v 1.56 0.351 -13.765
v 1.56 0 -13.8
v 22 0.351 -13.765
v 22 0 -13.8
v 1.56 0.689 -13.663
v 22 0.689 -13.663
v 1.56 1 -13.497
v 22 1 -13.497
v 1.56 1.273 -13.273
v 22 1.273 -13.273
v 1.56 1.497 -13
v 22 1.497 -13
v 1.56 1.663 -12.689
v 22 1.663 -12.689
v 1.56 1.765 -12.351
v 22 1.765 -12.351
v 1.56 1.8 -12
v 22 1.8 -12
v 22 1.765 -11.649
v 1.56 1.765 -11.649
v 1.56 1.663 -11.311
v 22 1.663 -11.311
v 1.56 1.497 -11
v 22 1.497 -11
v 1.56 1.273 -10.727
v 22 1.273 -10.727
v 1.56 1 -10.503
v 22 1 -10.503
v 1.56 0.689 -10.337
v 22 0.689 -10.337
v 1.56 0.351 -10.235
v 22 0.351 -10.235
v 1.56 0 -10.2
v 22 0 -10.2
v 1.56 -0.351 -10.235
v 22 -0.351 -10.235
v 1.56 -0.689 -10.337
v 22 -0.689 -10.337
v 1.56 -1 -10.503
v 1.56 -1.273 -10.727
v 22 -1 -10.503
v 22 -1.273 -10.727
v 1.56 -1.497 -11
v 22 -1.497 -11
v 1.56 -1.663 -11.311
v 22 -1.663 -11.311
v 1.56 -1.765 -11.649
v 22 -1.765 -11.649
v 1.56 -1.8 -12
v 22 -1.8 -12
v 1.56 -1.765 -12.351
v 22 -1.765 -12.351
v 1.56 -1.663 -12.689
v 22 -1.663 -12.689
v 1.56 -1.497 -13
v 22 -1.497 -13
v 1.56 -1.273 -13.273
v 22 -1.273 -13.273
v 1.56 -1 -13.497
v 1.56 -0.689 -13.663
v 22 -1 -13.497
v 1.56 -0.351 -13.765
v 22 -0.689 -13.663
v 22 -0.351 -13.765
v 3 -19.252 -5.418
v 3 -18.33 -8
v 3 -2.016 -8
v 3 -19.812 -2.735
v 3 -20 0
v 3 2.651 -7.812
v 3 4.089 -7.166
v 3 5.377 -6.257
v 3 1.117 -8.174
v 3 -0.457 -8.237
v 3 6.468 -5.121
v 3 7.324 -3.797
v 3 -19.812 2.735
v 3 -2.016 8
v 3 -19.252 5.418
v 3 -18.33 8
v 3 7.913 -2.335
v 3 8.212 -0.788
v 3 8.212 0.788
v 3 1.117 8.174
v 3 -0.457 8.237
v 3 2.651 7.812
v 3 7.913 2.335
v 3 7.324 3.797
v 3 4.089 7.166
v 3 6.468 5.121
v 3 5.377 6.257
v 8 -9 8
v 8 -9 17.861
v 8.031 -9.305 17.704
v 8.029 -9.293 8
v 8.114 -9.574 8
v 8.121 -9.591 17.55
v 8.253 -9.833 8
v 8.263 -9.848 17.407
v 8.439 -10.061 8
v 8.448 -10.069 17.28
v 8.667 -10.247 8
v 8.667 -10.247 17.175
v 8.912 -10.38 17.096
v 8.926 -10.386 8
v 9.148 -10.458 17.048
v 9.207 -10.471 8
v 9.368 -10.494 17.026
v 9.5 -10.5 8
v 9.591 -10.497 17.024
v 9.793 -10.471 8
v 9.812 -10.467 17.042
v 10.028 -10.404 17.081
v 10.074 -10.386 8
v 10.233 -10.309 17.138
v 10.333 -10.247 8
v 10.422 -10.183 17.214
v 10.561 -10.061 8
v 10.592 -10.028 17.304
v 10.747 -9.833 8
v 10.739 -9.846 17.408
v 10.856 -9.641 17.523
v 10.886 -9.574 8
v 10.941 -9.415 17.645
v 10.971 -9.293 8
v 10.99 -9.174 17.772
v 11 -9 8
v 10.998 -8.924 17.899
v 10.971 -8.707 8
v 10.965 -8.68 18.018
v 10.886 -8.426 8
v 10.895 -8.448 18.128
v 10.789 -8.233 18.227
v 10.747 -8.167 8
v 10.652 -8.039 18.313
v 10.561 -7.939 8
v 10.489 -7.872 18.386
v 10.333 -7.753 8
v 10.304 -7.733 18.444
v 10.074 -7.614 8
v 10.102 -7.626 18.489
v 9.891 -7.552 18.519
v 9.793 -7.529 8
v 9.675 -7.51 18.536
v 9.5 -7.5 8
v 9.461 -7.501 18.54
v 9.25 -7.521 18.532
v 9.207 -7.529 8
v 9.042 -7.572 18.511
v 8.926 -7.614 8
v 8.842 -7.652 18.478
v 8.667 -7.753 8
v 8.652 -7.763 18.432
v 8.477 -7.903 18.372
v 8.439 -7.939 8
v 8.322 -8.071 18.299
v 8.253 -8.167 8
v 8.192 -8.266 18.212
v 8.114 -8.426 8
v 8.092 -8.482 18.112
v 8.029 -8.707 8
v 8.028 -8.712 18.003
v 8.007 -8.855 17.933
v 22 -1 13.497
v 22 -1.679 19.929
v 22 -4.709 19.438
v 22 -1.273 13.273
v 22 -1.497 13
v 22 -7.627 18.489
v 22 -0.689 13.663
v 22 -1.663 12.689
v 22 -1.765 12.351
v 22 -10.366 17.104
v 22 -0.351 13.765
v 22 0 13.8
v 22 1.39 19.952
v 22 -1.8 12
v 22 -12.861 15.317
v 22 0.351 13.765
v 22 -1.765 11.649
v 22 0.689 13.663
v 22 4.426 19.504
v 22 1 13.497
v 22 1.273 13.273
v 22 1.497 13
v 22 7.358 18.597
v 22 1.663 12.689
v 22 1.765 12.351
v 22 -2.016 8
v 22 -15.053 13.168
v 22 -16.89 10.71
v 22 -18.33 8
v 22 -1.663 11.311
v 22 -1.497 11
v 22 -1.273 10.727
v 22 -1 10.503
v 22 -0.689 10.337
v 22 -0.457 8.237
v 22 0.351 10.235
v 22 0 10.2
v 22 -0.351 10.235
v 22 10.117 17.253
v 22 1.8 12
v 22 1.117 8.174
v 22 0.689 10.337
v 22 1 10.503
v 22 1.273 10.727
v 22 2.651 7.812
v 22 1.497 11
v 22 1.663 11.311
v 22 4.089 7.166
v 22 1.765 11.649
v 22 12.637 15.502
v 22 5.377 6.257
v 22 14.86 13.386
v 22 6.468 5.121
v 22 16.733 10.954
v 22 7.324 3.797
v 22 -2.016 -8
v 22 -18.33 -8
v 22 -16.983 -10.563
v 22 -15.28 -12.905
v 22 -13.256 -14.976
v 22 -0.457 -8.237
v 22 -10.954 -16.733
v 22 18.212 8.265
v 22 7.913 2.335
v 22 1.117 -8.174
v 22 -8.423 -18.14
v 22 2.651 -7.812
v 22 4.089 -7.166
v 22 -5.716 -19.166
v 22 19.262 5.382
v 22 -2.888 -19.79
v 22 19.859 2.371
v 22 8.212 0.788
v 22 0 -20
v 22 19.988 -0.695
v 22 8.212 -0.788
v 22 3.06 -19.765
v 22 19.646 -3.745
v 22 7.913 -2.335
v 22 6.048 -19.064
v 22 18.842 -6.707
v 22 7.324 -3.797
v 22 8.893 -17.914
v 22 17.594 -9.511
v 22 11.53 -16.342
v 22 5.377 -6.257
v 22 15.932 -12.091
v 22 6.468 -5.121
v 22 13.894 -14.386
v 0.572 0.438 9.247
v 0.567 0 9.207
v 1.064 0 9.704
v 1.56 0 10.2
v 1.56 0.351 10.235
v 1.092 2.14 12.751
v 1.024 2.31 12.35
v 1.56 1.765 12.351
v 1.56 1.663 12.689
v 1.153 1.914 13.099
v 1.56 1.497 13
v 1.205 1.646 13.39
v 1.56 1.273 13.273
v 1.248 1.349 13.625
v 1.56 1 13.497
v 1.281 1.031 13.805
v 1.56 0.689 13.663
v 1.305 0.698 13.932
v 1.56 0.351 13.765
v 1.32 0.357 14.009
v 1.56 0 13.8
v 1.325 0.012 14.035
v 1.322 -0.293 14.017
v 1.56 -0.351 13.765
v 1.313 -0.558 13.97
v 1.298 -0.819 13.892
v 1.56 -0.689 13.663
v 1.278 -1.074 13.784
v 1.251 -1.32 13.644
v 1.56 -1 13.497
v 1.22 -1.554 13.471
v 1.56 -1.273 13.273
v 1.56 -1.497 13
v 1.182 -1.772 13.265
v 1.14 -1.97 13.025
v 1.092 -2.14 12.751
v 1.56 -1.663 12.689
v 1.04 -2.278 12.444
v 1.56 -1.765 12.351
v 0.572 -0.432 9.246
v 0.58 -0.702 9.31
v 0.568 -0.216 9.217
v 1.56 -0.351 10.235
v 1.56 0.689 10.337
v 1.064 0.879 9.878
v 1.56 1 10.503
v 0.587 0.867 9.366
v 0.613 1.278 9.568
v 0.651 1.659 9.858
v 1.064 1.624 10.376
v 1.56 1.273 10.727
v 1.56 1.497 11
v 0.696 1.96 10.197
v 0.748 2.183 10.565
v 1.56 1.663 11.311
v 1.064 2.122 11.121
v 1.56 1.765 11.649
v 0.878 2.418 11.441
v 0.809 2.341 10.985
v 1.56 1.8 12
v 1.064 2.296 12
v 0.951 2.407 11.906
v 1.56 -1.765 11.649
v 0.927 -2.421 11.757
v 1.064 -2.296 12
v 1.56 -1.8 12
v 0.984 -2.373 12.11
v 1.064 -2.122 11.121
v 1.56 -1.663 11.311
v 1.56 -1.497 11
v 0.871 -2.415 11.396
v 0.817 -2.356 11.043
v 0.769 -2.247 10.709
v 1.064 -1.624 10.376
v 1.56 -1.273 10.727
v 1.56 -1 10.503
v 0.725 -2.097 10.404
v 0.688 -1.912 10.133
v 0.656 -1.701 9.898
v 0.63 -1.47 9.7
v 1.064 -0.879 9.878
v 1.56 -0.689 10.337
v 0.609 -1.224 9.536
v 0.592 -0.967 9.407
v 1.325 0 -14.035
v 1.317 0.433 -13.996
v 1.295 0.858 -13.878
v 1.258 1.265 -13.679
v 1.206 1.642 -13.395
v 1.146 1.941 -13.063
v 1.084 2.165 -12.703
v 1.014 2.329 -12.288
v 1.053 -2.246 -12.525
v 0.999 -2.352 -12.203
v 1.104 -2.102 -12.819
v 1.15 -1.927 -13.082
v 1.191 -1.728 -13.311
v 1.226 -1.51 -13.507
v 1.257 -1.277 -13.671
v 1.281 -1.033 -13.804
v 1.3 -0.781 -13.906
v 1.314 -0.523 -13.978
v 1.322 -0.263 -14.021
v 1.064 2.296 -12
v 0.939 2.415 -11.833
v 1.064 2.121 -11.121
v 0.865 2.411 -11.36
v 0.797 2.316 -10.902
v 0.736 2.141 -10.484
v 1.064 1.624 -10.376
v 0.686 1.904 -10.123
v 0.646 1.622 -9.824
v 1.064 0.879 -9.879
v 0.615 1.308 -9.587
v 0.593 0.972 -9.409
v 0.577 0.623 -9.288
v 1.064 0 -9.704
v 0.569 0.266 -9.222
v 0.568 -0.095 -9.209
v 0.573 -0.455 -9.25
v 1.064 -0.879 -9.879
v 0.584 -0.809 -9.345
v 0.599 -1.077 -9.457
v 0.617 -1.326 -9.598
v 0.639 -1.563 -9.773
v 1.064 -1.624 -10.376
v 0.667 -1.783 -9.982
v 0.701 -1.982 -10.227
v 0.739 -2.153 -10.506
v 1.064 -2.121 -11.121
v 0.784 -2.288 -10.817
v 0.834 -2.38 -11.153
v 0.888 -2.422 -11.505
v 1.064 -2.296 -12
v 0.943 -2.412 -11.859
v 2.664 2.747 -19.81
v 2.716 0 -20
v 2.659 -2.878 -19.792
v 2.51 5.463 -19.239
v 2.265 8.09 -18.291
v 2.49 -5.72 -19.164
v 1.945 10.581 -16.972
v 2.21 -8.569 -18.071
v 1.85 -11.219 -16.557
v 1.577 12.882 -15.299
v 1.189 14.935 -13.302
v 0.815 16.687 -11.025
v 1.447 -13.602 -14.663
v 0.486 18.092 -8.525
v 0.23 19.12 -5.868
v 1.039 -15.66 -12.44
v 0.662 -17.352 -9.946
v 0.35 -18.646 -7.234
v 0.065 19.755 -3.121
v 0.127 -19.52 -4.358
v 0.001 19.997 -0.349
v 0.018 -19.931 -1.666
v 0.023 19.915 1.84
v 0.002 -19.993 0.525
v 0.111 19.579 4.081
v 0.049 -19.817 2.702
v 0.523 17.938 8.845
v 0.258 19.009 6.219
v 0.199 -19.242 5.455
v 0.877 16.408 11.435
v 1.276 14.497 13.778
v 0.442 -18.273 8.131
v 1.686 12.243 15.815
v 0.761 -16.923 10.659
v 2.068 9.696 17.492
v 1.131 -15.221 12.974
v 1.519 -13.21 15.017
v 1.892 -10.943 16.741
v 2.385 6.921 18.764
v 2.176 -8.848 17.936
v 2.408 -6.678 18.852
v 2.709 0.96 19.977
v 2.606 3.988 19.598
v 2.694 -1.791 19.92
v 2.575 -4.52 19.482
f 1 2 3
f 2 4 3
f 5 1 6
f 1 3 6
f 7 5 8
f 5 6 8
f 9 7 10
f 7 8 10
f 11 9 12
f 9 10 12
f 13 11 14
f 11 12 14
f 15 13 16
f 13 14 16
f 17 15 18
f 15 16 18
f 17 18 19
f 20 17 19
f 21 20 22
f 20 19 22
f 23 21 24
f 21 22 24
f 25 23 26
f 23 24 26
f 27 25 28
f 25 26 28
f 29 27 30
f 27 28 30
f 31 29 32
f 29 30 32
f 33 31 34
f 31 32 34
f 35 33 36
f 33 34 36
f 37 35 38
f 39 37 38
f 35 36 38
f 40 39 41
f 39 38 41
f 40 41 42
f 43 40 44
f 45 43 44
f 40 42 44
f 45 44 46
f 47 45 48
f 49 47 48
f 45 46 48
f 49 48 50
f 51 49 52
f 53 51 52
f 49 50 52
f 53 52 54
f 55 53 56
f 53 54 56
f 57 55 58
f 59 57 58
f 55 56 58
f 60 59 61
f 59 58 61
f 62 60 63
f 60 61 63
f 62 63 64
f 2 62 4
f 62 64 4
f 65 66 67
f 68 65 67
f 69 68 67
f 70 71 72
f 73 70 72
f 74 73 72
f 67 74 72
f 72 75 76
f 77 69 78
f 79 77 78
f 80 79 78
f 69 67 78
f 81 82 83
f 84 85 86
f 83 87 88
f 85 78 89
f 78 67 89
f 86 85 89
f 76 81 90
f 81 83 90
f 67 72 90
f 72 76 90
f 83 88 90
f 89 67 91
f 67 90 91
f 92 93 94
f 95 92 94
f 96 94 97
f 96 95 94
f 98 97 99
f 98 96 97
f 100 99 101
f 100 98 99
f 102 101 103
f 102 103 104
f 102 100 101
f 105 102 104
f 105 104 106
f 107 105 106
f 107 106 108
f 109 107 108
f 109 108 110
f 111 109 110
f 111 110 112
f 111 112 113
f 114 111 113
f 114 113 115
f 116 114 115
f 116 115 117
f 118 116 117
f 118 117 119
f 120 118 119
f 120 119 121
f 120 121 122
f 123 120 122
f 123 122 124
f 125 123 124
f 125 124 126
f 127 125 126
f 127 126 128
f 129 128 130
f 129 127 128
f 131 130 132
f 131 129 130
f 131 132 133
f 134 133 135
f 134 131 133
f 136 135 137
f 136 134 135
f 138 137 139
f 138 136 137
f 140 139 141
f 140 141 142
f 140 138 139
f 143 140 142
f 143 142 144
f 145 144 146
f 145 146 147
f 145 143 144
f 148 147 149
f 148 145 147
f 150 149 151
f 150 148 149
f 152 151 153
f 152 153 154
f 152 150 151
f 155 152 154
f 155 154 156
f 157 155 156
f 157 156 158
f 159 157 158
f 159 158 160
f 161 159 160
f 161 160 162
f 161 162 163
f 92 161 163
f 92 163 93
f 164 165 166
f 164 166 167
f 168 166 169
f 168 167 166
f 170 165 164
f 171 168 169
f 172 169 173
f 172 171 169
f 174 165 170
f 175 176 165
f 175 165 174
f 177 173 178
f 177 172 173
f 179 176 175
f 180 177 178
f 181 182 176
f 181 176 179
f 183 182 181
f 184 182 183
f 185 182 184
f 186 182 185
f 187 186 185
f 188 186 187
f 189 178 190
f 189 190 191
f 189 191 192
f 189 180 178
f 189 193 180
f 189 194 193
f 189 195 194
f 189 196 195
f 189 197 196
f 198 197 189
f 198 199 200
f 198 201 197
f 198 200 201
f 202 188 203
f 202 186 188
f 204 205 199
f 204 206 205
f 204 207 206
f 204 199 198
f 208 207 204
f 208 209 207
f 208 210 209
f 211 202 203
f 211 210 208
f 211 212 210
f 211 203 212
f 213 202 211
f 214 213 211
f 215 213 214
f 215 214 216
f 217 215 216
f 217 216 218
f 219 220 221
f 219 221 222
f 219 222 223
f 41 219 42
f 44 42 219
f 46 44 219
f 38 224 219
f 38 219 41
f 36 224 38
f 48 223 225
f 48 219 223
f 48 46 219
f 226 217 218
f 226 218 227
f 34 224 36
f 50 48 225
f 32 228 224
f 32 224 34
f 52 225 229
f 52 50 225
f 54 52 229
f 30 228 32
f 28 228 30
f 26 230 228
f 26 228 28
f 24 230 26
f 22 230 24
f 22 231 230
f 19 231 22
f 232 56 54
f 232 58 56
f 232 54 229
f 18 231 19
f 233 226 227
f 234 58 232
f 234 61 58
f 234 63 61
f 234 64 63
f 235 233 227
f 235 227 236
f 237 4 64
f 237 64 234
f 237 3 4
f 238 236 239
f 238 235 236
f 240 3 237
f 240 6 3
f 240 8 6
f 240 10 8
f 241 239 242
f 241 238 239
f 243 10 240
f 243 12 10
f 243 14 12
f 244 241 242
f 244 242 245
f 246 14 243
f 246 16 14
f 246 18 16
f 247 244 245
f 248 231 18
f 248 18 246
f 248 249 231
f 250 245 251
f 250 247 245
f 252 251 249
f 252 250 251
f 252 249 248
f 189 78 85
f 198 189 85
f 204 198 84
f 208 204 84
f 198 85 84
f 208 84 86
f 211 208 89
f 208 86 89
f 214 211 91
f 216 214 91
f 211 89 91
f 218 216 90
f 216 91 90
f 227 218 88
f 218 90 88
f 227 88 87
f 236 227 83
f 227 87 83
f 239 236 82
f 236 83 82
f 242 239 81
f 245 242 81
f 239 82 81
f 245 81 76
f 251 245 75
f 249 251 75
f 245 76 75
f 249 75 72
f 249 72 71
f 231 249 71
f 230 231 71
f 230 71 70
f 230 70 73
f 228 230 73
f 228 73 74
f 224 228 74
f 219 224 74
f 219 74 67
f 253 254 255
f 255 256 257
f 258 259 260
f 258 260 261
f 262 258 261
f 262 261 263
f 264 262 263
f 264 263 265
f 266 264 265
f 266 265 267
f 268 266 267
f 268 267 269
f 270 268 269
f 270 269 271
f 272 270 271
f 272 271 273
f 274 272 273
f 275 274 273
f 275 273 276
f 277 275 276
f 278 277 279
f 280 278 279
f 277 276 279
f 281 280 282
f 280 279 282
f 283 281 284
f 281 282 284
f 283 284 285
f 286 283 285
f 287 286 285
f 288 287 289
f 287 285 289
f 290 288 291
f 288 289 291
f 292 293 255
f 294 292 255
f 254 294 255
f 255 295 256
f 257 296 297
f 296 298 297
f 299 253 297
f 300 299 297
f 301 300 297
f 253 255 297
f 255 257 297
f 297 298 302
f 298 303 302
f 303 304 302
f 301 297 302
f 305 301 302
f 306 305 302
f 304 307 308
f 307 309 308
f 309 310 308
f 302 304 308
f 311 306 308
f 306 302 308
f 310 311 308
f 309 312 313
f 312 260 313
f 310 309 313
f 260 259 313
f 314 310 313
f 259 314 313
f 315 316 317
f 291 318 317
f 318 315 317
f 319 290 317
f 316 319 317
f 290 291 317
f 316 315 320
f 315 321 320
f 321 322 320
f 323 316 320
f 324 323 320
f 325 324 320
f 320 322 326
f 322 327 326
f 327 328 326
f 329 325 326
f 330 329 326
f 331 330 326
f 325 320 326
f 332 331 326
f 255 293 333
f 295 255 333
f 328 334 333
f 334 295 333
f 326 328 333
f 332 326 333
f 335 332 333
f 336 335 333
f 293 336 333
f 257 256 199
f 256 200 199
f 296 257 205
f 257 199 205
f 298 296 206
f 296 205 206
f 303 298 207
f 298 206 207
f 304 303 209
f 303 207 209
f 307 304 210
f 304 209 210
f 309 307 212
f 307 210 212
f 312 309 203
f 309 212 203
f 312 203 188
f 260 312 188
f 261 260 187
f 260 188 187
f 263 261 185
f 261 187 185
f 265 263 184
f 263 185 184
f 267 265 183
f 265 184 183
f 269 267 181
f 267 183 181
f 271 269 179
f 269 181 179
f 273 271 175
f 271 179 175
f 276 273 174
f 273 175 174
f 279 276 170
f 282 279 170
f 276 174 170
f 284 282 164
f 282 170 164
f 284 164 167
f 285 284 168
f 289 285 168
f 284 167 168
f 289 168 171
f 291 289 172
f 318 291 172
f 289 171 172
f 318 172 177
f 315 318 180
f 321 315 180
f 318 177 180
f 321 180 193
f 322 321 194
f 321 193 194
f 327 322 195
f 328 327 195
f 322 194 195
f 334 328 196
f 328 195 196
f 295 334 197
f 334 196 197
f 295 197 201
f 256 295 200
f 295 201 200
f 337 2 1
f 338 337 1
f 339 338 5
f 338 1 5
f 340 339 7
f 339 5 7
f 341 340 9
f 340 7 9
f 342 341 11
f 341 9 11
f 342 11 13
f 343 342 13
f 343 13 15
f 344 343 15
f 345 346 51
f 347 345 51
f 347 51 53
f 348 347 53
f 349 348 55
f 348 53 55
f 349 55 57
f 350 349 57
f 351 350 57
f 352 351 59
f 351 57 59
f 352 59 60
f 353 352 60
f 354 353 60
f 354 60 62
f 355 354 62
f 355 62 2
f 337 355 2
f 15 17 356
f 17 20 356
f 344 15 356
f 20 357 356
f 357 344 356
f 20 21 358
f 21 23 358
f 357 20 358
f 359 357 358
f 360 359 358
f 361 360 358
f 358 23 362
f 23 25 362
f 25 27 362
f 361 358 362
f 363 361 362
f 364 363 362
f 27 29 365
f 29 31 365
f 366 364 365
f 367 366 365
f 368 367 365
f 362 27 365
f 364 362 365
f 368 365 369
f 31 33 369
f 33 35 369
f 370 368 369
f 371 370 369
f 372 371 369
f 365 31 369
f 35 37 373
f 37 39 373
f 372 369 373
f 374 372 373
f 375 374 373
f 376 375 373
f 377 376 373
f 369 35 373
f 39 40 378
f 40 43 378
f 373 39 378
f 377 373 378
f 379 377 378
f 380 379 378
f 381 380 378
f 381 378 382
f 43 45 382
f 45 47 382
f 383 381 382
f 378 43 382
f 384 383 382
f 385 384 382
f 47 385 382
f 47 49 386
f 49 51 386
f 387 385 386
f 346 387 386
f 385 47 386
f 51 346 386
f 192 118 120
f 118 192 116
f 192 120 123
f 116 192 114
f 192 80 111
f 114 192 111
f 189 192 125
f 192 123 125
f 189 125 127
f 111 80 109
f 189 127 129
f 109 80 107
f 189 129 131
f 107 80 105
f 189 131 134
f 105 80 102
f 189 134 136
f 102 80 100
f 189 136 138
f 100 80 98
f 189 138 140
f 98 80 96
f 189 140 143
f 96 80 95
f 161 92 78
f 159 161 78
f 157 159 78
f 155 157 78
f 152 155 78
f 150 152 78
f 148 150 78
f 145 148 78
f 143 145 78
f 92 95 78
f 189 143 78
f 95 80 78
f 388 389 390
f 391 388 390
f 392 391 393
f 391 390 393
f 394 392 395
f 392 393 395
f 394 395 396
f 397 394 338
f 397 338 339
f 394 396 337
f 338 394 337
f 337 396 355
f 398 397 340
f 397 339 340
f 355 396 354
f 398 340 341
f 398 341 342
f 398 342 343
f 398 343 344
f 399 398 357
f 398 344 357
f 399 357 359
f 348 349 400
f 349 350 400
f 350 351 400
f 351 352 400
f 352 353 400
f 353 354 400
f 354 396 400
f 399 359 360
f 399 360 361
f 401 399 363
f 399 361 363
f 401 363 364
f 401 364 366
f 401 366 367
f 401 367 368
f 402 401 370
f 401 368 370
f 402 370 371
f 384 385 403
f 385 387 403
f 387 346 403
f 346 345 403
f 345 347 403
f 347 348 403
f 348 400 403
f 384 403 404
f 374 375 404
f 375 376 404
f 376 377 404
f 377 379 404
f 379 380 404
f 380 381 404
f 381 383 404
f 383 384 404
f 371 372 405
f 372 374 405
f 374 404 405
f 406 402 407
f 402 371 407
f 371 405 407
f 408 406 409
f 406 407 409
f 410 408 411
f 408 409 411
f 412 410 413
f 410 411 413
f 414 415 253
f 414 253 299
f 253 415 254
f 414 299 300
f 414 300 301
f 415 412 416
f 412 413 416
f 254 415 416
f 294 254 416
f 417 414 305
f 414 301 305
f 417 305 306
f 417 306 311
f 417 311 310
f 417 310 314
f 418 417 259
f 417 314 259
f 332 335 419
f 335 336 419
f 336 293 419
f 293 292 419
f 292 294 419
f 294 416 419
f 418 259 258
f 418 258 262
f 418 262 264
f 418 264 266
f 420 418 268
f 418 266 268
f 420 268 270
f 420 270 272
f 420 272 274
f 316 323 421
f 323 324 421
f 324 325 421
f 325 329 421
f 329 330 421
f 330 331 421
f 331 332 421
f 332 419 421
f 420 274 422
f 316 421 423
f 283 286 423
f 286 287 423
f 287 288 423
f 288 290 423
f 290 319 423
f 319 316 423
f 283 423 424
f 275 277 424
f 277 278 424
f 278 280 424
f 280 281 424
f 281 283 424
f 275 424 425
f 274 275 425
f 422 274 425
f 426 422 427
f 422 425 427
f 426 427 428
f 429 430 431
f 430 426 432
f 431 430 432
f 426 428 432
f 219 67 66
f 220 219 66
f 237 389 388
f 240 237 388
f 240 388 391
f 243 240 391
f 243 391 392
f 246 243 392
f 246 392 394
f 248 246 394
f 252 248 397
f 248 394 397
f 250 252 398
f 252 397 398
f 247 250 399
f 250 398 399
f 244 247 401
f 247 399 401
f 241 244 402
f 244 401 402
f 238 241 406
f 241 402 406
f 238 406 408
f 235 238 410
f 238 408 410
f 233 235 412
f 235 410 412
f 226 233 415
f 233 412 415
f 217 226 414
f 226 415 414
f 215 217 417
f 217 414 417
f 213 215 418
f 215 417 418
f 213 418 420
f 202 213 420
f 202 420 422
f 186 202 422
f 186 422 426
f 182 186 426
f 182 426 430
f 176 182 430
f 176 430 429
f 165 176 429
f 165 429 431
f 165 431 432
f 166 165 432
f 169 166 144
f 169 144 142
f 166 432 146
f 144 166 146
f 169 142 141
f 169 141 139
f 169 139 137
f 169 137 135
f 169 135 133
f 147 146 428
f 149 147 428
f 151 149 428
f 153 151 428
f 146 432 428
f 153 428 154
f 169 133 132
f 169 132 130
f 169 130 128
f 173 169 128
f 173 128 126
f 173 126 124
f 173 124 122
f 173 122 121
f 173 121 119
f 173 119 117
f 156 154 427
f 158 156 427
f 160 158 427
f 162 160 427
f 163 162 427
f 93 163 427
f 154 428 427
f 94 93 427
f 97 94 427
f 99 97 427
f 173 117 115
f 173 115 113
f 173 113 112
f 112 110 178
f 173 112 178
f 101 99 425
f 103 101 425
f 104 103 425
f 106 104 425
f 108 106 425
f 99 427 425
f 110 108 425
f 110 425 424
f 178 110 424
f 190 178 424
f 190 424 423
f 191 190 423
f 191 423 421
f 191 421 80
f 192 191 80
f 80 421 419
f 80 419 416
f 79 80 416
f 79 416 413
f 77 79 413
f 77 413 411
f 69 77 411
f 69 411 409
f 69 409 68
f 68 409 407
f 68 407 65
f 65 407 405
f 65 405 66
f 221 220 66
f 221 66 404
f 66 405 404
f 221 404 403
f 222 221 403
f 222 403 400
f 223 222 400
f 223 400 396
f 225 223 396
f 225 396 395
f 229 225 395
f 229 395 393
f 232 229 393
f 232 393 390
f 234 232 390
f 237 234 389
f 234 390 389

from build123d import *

# Parameters (mm, degrees)
SKETCH1_R                               = 20
BLOCO_DEPTH                             = 22
ENCAIXE_START                           = -19
ENCAIXE_DO_POTENCI_METRO_DEPTH          = 19
FURO_DE_FIXA_O_PARAFUSO_M3_D            = 3.6
FURO_DE_FIXA_O_PARAFUSO_M3_CSINK_D      = 6.72
FURO_DE_FIXA_O_PARAFUSO_M3_CSINK_ANGLE  = 90
CORTE_ARREDONDAMENTO_DEPTH              = 36.832945734
CORTE_ARREDONDAMENTO_DEPTH_BACK         = 36.832945734
SKETCH7_R                               = 100
SKETCH7_R_2                             = 75
FURO_DE_FIXA_O_POTENCI_METRO_REACH      = 37.833
FURO_DE_FIXA_O_POTENCI_METRO_END_RADIUS = 20
SKETCH8_R                               = 1.5


with BuildPart() as part:
    # Sketch1 → Bloco (new body)
    with BuildSketch(Plane(origin=(0, 0, 0), x_dir=(0, 0, -1), z_dir=(1, 0, 0))):
        Circle(SKETCH1_R)
    extrude(amount=BLOCO_DEPTH)

    # Sketch2 → Encaixe do Potenciômetro (cut)
    with BuildSketch(Plane(origin=(22, 0, 0), x_dir=(0, 0, -1), z_dir=(1, 0, 0)).offset(ENCAIXE_START)):
        with BuildLine():
            Line((-8, -18.33030278), (-8, -2.015564437))
            ThreePointArc((-8, -2.015564437), (0, 8.25), (8, -2.015564437))
            Line((8, -2.015564437), (8, -18.33030278))
            ThreePointArc((8, -18.33030278), (0, -20), (-8, -18.33030278))
        make_face()
    extrude(amount=ENCAIXE_DO_POTENCI_METRO_DEPTH, mode=Mode.SUBTRACT)

    # Furo de Fixação - Parafuso M3 (through all)
    with Locations(Plane.ZY):
        with Locations((-12, 0), (12, 0)):
            CounterSinkHole(FURO_DE_FIXA_O_PARAFUSO_M3_D / 2, FURO_DE_FIXA_O_PARAFUSO_M3_CSINK_D / 2, counter_sink_angle=FURO_DE_FIXA_O_PARAFUSO_M3_CSINK_ANGLE)

    # Sketch7 → Corte - Arredondamento (cut, two sides: drawn at the far end of the back side and taken through both)
    with BuildSketch(Plane(origin=(0, 0, 0), x_dir=(1, 0, 0), z_dir=(0, 1, 0)).offset(-CORTE_ARREDONDAMENTO_DEPTH_BACK)):
        with Locations((75, 0)):
            Circle(SKETCH7_R)
        with Locations((75, 0)):
            Circle(SKETCH7_R_2, mode=Mode.SUBTRACT)
    extrude(amount=CORTE_ARREDONDAMENTO_DEPTH + CORTE_ARREDONDAMENTO_DEPTH_BACK, mode=Mode.SUBTRACT)

    # Furo de Fixação - Potenciômetro: up to this cylinder (the profile starts inside it)
    furo_de_fixa_o_potenci_metro_end = Plane(origin=(9.5, 0, 0), z_dir=(-1, 0, 0)) * Cylinder(FURO_DE_FIXA_O_POTENCI_METRO_END_RADIUS, 116.666, mode=Mode.PRIVATE)
    # Sketch8 → Furo de Fixação - Potenciômetro (cut, up to the surface)
    with BuildSketch(Plane.XY, mode=Mode.PRIVATE) as furo_de_fixa_o_potenci_metro_sk1:
        with Locations(Location((9.5, -9, 0), (0, 0, 180))):
            Circle(SKETCH8_R)
    furo_de_fixa_o_potenci_metro_tool1 = extrude(furo_de_fixa_o_potenci_metro_sk1.sketch, amount=FURO_DE_FIXA_O_POTENCI_METRO_REACH, mode=Mode.PRIVATE) & furo_de_fixa_o_potenci_metro_end
    add(furo_de_fixa_o_potenci_metro_tool1.solids().sort_by_distance((9.5, -9, 0))[0], mode=Mode.SUBTRACT)


solid = part.part
